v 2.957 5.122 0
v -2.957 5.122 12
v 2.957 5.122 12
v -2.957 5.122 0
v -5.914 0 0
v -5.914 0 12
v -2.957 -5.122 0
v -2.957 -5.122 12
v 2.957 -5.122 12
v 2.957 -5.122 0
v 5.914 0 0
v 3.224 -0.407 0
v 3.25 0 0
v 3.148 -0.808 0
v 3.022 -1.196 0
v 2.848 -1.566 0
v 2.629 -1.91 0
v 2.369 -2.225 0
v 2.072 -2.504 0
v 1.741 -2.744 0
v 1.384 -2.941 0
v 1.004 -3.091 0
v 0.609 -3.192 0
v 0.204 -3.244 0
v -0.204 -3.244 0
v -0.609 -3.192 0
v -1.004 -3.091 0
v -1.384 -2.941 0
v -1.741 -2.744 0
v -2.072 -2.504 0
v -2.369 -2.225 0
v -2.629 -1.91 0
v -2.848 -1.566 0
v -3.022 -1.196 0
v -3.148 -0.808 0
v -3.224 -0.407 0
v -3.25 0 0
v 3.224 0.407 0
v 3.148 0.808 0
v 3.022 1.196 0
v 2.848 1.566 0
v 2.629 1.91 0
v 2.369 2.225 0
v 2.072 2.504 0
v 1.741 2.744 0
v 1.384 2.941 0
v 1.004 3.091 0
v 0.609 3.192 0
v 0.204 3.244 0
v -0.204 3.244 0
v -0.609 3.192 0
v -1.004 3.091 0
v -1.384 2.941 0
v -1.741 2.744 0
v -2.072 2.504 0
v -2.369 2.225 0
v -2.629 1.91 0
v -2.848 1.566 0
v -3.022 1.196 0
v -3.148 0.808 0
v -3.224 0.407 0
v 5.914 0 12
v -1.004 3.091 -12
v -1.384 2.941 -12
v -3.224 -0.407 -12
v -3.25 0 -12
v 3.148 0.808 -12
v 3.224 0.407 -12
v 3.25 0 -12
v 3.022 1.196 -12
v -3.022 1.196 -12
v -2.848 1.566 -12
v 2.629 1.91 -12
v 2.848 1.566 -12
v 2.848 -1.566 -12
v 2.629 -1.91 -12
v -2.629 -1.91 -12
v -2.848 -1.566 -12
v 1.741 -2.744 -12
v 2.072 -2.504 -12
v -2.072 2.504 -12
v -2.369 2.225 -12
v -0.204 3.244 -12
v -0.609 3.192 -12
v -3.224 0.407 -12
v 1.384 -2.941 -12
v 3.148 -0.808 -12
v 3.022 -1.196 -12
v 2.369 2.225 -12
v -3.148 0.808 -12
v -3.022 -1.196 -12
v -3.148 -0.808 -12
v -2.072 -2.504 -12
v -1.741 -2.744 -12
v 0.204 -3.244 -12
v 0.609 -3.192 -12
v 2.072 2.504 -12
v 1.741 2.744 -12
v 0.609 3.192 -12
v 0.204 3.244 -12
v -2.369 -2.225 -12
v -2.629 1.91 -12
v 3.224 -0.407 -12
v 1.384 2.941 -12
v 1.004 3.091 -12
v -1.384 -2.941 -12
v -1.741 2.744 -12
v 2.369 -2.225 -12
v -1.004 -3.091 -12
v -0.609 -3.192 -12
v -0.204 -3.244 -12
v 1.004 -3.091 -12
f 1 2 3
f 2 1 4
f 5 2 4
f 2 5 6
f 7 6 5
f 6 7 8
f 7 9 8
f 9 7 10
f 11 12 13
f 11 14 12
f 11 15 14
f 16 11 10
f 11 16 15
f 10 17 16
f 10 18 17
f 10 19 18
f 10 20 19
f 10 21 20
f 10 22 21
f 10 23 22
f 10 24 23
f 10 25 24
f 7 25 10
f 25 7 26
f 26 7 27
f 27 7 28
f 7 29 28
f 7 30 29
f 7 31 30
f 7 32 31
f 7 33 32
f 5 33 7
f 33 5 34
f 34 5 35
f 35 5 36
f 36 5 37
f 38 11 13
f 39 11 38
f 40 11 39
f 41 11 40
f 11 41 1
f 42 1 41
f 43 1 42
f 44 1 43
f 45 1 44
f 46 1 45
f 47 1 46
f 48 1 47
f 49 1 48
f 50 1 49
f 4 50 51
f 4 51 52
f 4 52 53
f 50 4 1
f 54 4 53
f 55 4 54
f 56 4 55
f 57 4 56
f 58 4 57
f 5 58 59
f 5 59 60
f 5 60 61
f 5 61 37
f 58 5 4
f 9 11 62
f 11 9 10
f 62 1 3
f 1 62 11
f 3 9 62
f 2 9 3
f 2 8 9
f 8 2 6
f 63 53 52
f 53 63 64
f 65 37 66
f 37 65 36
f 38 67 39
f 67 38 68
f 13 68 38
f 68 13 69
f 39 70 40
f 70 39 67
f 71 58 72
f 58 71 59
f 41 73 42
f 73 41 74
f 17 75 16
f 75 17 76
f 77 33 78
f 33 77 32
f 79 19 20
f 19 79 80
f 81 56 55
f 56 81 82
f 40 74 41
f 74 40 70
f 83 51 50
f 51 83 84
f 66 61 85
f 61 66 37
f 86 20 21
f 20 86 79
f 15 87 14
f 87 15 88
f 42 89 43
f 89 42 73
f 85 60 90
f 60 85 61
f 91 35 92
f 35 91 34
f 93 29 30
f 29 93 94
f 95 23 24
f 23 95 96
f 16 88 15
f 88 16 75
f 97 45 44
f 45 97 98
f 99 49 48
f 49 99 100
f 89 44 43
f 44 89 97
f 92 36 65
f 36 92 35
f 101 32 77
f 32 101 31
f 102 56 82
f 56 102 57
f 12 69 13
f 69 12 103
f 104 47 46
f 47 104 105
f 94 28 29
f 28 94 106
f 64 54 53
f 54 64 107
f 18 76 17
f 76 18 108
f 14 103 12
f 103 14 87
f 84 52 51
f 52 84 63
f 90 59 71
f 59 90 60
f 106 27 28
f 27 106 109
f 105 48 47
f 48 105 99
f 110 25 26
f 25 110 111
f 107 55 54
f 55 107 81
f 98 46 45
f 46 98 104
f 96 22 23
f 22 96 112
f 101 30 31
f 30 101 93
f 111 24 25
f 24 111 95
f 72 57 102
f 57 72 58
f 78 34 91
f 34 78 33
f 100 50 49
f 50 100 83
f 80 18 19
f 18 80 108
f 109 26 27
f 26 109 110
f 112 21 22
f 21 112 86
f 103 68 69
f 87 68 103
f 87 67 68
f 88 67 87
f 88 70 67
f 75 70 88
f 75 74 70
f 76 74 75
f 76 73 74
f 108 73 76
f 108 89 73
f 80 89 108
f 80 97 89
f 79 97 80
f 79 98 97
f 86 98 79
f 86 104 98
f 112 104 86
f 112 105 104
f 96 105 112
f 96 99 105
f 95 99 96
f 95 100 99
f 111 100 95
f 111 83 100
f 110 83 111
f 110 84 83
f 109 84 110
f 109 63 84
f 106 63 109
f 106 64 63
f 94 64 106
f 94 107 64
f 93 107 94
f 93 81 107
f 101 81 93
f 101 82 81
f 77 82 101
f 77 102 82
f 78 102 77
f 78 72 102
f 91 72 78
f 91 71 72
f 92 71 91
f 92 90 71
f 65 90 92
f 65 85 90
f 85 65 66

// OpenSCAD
$fn = 50;


difference() {
	union() {
		linear_extrude(height = 12) {
			polygon(points = [[5.9142500000, 0.0000000000], [2.9571250000, 5.1218907443], [-2.9571250000, 5.1218907443], [-5.9142500000, 0.0000000000], [-2.9571250000, -5.1218907443], [2.9571250000, -5.1218907443]]);
		}
		translate(v = [0, 0, -12]) {
			cylinder(h = 12, r = 3.2500000000);
		}
	}
	union();
}
